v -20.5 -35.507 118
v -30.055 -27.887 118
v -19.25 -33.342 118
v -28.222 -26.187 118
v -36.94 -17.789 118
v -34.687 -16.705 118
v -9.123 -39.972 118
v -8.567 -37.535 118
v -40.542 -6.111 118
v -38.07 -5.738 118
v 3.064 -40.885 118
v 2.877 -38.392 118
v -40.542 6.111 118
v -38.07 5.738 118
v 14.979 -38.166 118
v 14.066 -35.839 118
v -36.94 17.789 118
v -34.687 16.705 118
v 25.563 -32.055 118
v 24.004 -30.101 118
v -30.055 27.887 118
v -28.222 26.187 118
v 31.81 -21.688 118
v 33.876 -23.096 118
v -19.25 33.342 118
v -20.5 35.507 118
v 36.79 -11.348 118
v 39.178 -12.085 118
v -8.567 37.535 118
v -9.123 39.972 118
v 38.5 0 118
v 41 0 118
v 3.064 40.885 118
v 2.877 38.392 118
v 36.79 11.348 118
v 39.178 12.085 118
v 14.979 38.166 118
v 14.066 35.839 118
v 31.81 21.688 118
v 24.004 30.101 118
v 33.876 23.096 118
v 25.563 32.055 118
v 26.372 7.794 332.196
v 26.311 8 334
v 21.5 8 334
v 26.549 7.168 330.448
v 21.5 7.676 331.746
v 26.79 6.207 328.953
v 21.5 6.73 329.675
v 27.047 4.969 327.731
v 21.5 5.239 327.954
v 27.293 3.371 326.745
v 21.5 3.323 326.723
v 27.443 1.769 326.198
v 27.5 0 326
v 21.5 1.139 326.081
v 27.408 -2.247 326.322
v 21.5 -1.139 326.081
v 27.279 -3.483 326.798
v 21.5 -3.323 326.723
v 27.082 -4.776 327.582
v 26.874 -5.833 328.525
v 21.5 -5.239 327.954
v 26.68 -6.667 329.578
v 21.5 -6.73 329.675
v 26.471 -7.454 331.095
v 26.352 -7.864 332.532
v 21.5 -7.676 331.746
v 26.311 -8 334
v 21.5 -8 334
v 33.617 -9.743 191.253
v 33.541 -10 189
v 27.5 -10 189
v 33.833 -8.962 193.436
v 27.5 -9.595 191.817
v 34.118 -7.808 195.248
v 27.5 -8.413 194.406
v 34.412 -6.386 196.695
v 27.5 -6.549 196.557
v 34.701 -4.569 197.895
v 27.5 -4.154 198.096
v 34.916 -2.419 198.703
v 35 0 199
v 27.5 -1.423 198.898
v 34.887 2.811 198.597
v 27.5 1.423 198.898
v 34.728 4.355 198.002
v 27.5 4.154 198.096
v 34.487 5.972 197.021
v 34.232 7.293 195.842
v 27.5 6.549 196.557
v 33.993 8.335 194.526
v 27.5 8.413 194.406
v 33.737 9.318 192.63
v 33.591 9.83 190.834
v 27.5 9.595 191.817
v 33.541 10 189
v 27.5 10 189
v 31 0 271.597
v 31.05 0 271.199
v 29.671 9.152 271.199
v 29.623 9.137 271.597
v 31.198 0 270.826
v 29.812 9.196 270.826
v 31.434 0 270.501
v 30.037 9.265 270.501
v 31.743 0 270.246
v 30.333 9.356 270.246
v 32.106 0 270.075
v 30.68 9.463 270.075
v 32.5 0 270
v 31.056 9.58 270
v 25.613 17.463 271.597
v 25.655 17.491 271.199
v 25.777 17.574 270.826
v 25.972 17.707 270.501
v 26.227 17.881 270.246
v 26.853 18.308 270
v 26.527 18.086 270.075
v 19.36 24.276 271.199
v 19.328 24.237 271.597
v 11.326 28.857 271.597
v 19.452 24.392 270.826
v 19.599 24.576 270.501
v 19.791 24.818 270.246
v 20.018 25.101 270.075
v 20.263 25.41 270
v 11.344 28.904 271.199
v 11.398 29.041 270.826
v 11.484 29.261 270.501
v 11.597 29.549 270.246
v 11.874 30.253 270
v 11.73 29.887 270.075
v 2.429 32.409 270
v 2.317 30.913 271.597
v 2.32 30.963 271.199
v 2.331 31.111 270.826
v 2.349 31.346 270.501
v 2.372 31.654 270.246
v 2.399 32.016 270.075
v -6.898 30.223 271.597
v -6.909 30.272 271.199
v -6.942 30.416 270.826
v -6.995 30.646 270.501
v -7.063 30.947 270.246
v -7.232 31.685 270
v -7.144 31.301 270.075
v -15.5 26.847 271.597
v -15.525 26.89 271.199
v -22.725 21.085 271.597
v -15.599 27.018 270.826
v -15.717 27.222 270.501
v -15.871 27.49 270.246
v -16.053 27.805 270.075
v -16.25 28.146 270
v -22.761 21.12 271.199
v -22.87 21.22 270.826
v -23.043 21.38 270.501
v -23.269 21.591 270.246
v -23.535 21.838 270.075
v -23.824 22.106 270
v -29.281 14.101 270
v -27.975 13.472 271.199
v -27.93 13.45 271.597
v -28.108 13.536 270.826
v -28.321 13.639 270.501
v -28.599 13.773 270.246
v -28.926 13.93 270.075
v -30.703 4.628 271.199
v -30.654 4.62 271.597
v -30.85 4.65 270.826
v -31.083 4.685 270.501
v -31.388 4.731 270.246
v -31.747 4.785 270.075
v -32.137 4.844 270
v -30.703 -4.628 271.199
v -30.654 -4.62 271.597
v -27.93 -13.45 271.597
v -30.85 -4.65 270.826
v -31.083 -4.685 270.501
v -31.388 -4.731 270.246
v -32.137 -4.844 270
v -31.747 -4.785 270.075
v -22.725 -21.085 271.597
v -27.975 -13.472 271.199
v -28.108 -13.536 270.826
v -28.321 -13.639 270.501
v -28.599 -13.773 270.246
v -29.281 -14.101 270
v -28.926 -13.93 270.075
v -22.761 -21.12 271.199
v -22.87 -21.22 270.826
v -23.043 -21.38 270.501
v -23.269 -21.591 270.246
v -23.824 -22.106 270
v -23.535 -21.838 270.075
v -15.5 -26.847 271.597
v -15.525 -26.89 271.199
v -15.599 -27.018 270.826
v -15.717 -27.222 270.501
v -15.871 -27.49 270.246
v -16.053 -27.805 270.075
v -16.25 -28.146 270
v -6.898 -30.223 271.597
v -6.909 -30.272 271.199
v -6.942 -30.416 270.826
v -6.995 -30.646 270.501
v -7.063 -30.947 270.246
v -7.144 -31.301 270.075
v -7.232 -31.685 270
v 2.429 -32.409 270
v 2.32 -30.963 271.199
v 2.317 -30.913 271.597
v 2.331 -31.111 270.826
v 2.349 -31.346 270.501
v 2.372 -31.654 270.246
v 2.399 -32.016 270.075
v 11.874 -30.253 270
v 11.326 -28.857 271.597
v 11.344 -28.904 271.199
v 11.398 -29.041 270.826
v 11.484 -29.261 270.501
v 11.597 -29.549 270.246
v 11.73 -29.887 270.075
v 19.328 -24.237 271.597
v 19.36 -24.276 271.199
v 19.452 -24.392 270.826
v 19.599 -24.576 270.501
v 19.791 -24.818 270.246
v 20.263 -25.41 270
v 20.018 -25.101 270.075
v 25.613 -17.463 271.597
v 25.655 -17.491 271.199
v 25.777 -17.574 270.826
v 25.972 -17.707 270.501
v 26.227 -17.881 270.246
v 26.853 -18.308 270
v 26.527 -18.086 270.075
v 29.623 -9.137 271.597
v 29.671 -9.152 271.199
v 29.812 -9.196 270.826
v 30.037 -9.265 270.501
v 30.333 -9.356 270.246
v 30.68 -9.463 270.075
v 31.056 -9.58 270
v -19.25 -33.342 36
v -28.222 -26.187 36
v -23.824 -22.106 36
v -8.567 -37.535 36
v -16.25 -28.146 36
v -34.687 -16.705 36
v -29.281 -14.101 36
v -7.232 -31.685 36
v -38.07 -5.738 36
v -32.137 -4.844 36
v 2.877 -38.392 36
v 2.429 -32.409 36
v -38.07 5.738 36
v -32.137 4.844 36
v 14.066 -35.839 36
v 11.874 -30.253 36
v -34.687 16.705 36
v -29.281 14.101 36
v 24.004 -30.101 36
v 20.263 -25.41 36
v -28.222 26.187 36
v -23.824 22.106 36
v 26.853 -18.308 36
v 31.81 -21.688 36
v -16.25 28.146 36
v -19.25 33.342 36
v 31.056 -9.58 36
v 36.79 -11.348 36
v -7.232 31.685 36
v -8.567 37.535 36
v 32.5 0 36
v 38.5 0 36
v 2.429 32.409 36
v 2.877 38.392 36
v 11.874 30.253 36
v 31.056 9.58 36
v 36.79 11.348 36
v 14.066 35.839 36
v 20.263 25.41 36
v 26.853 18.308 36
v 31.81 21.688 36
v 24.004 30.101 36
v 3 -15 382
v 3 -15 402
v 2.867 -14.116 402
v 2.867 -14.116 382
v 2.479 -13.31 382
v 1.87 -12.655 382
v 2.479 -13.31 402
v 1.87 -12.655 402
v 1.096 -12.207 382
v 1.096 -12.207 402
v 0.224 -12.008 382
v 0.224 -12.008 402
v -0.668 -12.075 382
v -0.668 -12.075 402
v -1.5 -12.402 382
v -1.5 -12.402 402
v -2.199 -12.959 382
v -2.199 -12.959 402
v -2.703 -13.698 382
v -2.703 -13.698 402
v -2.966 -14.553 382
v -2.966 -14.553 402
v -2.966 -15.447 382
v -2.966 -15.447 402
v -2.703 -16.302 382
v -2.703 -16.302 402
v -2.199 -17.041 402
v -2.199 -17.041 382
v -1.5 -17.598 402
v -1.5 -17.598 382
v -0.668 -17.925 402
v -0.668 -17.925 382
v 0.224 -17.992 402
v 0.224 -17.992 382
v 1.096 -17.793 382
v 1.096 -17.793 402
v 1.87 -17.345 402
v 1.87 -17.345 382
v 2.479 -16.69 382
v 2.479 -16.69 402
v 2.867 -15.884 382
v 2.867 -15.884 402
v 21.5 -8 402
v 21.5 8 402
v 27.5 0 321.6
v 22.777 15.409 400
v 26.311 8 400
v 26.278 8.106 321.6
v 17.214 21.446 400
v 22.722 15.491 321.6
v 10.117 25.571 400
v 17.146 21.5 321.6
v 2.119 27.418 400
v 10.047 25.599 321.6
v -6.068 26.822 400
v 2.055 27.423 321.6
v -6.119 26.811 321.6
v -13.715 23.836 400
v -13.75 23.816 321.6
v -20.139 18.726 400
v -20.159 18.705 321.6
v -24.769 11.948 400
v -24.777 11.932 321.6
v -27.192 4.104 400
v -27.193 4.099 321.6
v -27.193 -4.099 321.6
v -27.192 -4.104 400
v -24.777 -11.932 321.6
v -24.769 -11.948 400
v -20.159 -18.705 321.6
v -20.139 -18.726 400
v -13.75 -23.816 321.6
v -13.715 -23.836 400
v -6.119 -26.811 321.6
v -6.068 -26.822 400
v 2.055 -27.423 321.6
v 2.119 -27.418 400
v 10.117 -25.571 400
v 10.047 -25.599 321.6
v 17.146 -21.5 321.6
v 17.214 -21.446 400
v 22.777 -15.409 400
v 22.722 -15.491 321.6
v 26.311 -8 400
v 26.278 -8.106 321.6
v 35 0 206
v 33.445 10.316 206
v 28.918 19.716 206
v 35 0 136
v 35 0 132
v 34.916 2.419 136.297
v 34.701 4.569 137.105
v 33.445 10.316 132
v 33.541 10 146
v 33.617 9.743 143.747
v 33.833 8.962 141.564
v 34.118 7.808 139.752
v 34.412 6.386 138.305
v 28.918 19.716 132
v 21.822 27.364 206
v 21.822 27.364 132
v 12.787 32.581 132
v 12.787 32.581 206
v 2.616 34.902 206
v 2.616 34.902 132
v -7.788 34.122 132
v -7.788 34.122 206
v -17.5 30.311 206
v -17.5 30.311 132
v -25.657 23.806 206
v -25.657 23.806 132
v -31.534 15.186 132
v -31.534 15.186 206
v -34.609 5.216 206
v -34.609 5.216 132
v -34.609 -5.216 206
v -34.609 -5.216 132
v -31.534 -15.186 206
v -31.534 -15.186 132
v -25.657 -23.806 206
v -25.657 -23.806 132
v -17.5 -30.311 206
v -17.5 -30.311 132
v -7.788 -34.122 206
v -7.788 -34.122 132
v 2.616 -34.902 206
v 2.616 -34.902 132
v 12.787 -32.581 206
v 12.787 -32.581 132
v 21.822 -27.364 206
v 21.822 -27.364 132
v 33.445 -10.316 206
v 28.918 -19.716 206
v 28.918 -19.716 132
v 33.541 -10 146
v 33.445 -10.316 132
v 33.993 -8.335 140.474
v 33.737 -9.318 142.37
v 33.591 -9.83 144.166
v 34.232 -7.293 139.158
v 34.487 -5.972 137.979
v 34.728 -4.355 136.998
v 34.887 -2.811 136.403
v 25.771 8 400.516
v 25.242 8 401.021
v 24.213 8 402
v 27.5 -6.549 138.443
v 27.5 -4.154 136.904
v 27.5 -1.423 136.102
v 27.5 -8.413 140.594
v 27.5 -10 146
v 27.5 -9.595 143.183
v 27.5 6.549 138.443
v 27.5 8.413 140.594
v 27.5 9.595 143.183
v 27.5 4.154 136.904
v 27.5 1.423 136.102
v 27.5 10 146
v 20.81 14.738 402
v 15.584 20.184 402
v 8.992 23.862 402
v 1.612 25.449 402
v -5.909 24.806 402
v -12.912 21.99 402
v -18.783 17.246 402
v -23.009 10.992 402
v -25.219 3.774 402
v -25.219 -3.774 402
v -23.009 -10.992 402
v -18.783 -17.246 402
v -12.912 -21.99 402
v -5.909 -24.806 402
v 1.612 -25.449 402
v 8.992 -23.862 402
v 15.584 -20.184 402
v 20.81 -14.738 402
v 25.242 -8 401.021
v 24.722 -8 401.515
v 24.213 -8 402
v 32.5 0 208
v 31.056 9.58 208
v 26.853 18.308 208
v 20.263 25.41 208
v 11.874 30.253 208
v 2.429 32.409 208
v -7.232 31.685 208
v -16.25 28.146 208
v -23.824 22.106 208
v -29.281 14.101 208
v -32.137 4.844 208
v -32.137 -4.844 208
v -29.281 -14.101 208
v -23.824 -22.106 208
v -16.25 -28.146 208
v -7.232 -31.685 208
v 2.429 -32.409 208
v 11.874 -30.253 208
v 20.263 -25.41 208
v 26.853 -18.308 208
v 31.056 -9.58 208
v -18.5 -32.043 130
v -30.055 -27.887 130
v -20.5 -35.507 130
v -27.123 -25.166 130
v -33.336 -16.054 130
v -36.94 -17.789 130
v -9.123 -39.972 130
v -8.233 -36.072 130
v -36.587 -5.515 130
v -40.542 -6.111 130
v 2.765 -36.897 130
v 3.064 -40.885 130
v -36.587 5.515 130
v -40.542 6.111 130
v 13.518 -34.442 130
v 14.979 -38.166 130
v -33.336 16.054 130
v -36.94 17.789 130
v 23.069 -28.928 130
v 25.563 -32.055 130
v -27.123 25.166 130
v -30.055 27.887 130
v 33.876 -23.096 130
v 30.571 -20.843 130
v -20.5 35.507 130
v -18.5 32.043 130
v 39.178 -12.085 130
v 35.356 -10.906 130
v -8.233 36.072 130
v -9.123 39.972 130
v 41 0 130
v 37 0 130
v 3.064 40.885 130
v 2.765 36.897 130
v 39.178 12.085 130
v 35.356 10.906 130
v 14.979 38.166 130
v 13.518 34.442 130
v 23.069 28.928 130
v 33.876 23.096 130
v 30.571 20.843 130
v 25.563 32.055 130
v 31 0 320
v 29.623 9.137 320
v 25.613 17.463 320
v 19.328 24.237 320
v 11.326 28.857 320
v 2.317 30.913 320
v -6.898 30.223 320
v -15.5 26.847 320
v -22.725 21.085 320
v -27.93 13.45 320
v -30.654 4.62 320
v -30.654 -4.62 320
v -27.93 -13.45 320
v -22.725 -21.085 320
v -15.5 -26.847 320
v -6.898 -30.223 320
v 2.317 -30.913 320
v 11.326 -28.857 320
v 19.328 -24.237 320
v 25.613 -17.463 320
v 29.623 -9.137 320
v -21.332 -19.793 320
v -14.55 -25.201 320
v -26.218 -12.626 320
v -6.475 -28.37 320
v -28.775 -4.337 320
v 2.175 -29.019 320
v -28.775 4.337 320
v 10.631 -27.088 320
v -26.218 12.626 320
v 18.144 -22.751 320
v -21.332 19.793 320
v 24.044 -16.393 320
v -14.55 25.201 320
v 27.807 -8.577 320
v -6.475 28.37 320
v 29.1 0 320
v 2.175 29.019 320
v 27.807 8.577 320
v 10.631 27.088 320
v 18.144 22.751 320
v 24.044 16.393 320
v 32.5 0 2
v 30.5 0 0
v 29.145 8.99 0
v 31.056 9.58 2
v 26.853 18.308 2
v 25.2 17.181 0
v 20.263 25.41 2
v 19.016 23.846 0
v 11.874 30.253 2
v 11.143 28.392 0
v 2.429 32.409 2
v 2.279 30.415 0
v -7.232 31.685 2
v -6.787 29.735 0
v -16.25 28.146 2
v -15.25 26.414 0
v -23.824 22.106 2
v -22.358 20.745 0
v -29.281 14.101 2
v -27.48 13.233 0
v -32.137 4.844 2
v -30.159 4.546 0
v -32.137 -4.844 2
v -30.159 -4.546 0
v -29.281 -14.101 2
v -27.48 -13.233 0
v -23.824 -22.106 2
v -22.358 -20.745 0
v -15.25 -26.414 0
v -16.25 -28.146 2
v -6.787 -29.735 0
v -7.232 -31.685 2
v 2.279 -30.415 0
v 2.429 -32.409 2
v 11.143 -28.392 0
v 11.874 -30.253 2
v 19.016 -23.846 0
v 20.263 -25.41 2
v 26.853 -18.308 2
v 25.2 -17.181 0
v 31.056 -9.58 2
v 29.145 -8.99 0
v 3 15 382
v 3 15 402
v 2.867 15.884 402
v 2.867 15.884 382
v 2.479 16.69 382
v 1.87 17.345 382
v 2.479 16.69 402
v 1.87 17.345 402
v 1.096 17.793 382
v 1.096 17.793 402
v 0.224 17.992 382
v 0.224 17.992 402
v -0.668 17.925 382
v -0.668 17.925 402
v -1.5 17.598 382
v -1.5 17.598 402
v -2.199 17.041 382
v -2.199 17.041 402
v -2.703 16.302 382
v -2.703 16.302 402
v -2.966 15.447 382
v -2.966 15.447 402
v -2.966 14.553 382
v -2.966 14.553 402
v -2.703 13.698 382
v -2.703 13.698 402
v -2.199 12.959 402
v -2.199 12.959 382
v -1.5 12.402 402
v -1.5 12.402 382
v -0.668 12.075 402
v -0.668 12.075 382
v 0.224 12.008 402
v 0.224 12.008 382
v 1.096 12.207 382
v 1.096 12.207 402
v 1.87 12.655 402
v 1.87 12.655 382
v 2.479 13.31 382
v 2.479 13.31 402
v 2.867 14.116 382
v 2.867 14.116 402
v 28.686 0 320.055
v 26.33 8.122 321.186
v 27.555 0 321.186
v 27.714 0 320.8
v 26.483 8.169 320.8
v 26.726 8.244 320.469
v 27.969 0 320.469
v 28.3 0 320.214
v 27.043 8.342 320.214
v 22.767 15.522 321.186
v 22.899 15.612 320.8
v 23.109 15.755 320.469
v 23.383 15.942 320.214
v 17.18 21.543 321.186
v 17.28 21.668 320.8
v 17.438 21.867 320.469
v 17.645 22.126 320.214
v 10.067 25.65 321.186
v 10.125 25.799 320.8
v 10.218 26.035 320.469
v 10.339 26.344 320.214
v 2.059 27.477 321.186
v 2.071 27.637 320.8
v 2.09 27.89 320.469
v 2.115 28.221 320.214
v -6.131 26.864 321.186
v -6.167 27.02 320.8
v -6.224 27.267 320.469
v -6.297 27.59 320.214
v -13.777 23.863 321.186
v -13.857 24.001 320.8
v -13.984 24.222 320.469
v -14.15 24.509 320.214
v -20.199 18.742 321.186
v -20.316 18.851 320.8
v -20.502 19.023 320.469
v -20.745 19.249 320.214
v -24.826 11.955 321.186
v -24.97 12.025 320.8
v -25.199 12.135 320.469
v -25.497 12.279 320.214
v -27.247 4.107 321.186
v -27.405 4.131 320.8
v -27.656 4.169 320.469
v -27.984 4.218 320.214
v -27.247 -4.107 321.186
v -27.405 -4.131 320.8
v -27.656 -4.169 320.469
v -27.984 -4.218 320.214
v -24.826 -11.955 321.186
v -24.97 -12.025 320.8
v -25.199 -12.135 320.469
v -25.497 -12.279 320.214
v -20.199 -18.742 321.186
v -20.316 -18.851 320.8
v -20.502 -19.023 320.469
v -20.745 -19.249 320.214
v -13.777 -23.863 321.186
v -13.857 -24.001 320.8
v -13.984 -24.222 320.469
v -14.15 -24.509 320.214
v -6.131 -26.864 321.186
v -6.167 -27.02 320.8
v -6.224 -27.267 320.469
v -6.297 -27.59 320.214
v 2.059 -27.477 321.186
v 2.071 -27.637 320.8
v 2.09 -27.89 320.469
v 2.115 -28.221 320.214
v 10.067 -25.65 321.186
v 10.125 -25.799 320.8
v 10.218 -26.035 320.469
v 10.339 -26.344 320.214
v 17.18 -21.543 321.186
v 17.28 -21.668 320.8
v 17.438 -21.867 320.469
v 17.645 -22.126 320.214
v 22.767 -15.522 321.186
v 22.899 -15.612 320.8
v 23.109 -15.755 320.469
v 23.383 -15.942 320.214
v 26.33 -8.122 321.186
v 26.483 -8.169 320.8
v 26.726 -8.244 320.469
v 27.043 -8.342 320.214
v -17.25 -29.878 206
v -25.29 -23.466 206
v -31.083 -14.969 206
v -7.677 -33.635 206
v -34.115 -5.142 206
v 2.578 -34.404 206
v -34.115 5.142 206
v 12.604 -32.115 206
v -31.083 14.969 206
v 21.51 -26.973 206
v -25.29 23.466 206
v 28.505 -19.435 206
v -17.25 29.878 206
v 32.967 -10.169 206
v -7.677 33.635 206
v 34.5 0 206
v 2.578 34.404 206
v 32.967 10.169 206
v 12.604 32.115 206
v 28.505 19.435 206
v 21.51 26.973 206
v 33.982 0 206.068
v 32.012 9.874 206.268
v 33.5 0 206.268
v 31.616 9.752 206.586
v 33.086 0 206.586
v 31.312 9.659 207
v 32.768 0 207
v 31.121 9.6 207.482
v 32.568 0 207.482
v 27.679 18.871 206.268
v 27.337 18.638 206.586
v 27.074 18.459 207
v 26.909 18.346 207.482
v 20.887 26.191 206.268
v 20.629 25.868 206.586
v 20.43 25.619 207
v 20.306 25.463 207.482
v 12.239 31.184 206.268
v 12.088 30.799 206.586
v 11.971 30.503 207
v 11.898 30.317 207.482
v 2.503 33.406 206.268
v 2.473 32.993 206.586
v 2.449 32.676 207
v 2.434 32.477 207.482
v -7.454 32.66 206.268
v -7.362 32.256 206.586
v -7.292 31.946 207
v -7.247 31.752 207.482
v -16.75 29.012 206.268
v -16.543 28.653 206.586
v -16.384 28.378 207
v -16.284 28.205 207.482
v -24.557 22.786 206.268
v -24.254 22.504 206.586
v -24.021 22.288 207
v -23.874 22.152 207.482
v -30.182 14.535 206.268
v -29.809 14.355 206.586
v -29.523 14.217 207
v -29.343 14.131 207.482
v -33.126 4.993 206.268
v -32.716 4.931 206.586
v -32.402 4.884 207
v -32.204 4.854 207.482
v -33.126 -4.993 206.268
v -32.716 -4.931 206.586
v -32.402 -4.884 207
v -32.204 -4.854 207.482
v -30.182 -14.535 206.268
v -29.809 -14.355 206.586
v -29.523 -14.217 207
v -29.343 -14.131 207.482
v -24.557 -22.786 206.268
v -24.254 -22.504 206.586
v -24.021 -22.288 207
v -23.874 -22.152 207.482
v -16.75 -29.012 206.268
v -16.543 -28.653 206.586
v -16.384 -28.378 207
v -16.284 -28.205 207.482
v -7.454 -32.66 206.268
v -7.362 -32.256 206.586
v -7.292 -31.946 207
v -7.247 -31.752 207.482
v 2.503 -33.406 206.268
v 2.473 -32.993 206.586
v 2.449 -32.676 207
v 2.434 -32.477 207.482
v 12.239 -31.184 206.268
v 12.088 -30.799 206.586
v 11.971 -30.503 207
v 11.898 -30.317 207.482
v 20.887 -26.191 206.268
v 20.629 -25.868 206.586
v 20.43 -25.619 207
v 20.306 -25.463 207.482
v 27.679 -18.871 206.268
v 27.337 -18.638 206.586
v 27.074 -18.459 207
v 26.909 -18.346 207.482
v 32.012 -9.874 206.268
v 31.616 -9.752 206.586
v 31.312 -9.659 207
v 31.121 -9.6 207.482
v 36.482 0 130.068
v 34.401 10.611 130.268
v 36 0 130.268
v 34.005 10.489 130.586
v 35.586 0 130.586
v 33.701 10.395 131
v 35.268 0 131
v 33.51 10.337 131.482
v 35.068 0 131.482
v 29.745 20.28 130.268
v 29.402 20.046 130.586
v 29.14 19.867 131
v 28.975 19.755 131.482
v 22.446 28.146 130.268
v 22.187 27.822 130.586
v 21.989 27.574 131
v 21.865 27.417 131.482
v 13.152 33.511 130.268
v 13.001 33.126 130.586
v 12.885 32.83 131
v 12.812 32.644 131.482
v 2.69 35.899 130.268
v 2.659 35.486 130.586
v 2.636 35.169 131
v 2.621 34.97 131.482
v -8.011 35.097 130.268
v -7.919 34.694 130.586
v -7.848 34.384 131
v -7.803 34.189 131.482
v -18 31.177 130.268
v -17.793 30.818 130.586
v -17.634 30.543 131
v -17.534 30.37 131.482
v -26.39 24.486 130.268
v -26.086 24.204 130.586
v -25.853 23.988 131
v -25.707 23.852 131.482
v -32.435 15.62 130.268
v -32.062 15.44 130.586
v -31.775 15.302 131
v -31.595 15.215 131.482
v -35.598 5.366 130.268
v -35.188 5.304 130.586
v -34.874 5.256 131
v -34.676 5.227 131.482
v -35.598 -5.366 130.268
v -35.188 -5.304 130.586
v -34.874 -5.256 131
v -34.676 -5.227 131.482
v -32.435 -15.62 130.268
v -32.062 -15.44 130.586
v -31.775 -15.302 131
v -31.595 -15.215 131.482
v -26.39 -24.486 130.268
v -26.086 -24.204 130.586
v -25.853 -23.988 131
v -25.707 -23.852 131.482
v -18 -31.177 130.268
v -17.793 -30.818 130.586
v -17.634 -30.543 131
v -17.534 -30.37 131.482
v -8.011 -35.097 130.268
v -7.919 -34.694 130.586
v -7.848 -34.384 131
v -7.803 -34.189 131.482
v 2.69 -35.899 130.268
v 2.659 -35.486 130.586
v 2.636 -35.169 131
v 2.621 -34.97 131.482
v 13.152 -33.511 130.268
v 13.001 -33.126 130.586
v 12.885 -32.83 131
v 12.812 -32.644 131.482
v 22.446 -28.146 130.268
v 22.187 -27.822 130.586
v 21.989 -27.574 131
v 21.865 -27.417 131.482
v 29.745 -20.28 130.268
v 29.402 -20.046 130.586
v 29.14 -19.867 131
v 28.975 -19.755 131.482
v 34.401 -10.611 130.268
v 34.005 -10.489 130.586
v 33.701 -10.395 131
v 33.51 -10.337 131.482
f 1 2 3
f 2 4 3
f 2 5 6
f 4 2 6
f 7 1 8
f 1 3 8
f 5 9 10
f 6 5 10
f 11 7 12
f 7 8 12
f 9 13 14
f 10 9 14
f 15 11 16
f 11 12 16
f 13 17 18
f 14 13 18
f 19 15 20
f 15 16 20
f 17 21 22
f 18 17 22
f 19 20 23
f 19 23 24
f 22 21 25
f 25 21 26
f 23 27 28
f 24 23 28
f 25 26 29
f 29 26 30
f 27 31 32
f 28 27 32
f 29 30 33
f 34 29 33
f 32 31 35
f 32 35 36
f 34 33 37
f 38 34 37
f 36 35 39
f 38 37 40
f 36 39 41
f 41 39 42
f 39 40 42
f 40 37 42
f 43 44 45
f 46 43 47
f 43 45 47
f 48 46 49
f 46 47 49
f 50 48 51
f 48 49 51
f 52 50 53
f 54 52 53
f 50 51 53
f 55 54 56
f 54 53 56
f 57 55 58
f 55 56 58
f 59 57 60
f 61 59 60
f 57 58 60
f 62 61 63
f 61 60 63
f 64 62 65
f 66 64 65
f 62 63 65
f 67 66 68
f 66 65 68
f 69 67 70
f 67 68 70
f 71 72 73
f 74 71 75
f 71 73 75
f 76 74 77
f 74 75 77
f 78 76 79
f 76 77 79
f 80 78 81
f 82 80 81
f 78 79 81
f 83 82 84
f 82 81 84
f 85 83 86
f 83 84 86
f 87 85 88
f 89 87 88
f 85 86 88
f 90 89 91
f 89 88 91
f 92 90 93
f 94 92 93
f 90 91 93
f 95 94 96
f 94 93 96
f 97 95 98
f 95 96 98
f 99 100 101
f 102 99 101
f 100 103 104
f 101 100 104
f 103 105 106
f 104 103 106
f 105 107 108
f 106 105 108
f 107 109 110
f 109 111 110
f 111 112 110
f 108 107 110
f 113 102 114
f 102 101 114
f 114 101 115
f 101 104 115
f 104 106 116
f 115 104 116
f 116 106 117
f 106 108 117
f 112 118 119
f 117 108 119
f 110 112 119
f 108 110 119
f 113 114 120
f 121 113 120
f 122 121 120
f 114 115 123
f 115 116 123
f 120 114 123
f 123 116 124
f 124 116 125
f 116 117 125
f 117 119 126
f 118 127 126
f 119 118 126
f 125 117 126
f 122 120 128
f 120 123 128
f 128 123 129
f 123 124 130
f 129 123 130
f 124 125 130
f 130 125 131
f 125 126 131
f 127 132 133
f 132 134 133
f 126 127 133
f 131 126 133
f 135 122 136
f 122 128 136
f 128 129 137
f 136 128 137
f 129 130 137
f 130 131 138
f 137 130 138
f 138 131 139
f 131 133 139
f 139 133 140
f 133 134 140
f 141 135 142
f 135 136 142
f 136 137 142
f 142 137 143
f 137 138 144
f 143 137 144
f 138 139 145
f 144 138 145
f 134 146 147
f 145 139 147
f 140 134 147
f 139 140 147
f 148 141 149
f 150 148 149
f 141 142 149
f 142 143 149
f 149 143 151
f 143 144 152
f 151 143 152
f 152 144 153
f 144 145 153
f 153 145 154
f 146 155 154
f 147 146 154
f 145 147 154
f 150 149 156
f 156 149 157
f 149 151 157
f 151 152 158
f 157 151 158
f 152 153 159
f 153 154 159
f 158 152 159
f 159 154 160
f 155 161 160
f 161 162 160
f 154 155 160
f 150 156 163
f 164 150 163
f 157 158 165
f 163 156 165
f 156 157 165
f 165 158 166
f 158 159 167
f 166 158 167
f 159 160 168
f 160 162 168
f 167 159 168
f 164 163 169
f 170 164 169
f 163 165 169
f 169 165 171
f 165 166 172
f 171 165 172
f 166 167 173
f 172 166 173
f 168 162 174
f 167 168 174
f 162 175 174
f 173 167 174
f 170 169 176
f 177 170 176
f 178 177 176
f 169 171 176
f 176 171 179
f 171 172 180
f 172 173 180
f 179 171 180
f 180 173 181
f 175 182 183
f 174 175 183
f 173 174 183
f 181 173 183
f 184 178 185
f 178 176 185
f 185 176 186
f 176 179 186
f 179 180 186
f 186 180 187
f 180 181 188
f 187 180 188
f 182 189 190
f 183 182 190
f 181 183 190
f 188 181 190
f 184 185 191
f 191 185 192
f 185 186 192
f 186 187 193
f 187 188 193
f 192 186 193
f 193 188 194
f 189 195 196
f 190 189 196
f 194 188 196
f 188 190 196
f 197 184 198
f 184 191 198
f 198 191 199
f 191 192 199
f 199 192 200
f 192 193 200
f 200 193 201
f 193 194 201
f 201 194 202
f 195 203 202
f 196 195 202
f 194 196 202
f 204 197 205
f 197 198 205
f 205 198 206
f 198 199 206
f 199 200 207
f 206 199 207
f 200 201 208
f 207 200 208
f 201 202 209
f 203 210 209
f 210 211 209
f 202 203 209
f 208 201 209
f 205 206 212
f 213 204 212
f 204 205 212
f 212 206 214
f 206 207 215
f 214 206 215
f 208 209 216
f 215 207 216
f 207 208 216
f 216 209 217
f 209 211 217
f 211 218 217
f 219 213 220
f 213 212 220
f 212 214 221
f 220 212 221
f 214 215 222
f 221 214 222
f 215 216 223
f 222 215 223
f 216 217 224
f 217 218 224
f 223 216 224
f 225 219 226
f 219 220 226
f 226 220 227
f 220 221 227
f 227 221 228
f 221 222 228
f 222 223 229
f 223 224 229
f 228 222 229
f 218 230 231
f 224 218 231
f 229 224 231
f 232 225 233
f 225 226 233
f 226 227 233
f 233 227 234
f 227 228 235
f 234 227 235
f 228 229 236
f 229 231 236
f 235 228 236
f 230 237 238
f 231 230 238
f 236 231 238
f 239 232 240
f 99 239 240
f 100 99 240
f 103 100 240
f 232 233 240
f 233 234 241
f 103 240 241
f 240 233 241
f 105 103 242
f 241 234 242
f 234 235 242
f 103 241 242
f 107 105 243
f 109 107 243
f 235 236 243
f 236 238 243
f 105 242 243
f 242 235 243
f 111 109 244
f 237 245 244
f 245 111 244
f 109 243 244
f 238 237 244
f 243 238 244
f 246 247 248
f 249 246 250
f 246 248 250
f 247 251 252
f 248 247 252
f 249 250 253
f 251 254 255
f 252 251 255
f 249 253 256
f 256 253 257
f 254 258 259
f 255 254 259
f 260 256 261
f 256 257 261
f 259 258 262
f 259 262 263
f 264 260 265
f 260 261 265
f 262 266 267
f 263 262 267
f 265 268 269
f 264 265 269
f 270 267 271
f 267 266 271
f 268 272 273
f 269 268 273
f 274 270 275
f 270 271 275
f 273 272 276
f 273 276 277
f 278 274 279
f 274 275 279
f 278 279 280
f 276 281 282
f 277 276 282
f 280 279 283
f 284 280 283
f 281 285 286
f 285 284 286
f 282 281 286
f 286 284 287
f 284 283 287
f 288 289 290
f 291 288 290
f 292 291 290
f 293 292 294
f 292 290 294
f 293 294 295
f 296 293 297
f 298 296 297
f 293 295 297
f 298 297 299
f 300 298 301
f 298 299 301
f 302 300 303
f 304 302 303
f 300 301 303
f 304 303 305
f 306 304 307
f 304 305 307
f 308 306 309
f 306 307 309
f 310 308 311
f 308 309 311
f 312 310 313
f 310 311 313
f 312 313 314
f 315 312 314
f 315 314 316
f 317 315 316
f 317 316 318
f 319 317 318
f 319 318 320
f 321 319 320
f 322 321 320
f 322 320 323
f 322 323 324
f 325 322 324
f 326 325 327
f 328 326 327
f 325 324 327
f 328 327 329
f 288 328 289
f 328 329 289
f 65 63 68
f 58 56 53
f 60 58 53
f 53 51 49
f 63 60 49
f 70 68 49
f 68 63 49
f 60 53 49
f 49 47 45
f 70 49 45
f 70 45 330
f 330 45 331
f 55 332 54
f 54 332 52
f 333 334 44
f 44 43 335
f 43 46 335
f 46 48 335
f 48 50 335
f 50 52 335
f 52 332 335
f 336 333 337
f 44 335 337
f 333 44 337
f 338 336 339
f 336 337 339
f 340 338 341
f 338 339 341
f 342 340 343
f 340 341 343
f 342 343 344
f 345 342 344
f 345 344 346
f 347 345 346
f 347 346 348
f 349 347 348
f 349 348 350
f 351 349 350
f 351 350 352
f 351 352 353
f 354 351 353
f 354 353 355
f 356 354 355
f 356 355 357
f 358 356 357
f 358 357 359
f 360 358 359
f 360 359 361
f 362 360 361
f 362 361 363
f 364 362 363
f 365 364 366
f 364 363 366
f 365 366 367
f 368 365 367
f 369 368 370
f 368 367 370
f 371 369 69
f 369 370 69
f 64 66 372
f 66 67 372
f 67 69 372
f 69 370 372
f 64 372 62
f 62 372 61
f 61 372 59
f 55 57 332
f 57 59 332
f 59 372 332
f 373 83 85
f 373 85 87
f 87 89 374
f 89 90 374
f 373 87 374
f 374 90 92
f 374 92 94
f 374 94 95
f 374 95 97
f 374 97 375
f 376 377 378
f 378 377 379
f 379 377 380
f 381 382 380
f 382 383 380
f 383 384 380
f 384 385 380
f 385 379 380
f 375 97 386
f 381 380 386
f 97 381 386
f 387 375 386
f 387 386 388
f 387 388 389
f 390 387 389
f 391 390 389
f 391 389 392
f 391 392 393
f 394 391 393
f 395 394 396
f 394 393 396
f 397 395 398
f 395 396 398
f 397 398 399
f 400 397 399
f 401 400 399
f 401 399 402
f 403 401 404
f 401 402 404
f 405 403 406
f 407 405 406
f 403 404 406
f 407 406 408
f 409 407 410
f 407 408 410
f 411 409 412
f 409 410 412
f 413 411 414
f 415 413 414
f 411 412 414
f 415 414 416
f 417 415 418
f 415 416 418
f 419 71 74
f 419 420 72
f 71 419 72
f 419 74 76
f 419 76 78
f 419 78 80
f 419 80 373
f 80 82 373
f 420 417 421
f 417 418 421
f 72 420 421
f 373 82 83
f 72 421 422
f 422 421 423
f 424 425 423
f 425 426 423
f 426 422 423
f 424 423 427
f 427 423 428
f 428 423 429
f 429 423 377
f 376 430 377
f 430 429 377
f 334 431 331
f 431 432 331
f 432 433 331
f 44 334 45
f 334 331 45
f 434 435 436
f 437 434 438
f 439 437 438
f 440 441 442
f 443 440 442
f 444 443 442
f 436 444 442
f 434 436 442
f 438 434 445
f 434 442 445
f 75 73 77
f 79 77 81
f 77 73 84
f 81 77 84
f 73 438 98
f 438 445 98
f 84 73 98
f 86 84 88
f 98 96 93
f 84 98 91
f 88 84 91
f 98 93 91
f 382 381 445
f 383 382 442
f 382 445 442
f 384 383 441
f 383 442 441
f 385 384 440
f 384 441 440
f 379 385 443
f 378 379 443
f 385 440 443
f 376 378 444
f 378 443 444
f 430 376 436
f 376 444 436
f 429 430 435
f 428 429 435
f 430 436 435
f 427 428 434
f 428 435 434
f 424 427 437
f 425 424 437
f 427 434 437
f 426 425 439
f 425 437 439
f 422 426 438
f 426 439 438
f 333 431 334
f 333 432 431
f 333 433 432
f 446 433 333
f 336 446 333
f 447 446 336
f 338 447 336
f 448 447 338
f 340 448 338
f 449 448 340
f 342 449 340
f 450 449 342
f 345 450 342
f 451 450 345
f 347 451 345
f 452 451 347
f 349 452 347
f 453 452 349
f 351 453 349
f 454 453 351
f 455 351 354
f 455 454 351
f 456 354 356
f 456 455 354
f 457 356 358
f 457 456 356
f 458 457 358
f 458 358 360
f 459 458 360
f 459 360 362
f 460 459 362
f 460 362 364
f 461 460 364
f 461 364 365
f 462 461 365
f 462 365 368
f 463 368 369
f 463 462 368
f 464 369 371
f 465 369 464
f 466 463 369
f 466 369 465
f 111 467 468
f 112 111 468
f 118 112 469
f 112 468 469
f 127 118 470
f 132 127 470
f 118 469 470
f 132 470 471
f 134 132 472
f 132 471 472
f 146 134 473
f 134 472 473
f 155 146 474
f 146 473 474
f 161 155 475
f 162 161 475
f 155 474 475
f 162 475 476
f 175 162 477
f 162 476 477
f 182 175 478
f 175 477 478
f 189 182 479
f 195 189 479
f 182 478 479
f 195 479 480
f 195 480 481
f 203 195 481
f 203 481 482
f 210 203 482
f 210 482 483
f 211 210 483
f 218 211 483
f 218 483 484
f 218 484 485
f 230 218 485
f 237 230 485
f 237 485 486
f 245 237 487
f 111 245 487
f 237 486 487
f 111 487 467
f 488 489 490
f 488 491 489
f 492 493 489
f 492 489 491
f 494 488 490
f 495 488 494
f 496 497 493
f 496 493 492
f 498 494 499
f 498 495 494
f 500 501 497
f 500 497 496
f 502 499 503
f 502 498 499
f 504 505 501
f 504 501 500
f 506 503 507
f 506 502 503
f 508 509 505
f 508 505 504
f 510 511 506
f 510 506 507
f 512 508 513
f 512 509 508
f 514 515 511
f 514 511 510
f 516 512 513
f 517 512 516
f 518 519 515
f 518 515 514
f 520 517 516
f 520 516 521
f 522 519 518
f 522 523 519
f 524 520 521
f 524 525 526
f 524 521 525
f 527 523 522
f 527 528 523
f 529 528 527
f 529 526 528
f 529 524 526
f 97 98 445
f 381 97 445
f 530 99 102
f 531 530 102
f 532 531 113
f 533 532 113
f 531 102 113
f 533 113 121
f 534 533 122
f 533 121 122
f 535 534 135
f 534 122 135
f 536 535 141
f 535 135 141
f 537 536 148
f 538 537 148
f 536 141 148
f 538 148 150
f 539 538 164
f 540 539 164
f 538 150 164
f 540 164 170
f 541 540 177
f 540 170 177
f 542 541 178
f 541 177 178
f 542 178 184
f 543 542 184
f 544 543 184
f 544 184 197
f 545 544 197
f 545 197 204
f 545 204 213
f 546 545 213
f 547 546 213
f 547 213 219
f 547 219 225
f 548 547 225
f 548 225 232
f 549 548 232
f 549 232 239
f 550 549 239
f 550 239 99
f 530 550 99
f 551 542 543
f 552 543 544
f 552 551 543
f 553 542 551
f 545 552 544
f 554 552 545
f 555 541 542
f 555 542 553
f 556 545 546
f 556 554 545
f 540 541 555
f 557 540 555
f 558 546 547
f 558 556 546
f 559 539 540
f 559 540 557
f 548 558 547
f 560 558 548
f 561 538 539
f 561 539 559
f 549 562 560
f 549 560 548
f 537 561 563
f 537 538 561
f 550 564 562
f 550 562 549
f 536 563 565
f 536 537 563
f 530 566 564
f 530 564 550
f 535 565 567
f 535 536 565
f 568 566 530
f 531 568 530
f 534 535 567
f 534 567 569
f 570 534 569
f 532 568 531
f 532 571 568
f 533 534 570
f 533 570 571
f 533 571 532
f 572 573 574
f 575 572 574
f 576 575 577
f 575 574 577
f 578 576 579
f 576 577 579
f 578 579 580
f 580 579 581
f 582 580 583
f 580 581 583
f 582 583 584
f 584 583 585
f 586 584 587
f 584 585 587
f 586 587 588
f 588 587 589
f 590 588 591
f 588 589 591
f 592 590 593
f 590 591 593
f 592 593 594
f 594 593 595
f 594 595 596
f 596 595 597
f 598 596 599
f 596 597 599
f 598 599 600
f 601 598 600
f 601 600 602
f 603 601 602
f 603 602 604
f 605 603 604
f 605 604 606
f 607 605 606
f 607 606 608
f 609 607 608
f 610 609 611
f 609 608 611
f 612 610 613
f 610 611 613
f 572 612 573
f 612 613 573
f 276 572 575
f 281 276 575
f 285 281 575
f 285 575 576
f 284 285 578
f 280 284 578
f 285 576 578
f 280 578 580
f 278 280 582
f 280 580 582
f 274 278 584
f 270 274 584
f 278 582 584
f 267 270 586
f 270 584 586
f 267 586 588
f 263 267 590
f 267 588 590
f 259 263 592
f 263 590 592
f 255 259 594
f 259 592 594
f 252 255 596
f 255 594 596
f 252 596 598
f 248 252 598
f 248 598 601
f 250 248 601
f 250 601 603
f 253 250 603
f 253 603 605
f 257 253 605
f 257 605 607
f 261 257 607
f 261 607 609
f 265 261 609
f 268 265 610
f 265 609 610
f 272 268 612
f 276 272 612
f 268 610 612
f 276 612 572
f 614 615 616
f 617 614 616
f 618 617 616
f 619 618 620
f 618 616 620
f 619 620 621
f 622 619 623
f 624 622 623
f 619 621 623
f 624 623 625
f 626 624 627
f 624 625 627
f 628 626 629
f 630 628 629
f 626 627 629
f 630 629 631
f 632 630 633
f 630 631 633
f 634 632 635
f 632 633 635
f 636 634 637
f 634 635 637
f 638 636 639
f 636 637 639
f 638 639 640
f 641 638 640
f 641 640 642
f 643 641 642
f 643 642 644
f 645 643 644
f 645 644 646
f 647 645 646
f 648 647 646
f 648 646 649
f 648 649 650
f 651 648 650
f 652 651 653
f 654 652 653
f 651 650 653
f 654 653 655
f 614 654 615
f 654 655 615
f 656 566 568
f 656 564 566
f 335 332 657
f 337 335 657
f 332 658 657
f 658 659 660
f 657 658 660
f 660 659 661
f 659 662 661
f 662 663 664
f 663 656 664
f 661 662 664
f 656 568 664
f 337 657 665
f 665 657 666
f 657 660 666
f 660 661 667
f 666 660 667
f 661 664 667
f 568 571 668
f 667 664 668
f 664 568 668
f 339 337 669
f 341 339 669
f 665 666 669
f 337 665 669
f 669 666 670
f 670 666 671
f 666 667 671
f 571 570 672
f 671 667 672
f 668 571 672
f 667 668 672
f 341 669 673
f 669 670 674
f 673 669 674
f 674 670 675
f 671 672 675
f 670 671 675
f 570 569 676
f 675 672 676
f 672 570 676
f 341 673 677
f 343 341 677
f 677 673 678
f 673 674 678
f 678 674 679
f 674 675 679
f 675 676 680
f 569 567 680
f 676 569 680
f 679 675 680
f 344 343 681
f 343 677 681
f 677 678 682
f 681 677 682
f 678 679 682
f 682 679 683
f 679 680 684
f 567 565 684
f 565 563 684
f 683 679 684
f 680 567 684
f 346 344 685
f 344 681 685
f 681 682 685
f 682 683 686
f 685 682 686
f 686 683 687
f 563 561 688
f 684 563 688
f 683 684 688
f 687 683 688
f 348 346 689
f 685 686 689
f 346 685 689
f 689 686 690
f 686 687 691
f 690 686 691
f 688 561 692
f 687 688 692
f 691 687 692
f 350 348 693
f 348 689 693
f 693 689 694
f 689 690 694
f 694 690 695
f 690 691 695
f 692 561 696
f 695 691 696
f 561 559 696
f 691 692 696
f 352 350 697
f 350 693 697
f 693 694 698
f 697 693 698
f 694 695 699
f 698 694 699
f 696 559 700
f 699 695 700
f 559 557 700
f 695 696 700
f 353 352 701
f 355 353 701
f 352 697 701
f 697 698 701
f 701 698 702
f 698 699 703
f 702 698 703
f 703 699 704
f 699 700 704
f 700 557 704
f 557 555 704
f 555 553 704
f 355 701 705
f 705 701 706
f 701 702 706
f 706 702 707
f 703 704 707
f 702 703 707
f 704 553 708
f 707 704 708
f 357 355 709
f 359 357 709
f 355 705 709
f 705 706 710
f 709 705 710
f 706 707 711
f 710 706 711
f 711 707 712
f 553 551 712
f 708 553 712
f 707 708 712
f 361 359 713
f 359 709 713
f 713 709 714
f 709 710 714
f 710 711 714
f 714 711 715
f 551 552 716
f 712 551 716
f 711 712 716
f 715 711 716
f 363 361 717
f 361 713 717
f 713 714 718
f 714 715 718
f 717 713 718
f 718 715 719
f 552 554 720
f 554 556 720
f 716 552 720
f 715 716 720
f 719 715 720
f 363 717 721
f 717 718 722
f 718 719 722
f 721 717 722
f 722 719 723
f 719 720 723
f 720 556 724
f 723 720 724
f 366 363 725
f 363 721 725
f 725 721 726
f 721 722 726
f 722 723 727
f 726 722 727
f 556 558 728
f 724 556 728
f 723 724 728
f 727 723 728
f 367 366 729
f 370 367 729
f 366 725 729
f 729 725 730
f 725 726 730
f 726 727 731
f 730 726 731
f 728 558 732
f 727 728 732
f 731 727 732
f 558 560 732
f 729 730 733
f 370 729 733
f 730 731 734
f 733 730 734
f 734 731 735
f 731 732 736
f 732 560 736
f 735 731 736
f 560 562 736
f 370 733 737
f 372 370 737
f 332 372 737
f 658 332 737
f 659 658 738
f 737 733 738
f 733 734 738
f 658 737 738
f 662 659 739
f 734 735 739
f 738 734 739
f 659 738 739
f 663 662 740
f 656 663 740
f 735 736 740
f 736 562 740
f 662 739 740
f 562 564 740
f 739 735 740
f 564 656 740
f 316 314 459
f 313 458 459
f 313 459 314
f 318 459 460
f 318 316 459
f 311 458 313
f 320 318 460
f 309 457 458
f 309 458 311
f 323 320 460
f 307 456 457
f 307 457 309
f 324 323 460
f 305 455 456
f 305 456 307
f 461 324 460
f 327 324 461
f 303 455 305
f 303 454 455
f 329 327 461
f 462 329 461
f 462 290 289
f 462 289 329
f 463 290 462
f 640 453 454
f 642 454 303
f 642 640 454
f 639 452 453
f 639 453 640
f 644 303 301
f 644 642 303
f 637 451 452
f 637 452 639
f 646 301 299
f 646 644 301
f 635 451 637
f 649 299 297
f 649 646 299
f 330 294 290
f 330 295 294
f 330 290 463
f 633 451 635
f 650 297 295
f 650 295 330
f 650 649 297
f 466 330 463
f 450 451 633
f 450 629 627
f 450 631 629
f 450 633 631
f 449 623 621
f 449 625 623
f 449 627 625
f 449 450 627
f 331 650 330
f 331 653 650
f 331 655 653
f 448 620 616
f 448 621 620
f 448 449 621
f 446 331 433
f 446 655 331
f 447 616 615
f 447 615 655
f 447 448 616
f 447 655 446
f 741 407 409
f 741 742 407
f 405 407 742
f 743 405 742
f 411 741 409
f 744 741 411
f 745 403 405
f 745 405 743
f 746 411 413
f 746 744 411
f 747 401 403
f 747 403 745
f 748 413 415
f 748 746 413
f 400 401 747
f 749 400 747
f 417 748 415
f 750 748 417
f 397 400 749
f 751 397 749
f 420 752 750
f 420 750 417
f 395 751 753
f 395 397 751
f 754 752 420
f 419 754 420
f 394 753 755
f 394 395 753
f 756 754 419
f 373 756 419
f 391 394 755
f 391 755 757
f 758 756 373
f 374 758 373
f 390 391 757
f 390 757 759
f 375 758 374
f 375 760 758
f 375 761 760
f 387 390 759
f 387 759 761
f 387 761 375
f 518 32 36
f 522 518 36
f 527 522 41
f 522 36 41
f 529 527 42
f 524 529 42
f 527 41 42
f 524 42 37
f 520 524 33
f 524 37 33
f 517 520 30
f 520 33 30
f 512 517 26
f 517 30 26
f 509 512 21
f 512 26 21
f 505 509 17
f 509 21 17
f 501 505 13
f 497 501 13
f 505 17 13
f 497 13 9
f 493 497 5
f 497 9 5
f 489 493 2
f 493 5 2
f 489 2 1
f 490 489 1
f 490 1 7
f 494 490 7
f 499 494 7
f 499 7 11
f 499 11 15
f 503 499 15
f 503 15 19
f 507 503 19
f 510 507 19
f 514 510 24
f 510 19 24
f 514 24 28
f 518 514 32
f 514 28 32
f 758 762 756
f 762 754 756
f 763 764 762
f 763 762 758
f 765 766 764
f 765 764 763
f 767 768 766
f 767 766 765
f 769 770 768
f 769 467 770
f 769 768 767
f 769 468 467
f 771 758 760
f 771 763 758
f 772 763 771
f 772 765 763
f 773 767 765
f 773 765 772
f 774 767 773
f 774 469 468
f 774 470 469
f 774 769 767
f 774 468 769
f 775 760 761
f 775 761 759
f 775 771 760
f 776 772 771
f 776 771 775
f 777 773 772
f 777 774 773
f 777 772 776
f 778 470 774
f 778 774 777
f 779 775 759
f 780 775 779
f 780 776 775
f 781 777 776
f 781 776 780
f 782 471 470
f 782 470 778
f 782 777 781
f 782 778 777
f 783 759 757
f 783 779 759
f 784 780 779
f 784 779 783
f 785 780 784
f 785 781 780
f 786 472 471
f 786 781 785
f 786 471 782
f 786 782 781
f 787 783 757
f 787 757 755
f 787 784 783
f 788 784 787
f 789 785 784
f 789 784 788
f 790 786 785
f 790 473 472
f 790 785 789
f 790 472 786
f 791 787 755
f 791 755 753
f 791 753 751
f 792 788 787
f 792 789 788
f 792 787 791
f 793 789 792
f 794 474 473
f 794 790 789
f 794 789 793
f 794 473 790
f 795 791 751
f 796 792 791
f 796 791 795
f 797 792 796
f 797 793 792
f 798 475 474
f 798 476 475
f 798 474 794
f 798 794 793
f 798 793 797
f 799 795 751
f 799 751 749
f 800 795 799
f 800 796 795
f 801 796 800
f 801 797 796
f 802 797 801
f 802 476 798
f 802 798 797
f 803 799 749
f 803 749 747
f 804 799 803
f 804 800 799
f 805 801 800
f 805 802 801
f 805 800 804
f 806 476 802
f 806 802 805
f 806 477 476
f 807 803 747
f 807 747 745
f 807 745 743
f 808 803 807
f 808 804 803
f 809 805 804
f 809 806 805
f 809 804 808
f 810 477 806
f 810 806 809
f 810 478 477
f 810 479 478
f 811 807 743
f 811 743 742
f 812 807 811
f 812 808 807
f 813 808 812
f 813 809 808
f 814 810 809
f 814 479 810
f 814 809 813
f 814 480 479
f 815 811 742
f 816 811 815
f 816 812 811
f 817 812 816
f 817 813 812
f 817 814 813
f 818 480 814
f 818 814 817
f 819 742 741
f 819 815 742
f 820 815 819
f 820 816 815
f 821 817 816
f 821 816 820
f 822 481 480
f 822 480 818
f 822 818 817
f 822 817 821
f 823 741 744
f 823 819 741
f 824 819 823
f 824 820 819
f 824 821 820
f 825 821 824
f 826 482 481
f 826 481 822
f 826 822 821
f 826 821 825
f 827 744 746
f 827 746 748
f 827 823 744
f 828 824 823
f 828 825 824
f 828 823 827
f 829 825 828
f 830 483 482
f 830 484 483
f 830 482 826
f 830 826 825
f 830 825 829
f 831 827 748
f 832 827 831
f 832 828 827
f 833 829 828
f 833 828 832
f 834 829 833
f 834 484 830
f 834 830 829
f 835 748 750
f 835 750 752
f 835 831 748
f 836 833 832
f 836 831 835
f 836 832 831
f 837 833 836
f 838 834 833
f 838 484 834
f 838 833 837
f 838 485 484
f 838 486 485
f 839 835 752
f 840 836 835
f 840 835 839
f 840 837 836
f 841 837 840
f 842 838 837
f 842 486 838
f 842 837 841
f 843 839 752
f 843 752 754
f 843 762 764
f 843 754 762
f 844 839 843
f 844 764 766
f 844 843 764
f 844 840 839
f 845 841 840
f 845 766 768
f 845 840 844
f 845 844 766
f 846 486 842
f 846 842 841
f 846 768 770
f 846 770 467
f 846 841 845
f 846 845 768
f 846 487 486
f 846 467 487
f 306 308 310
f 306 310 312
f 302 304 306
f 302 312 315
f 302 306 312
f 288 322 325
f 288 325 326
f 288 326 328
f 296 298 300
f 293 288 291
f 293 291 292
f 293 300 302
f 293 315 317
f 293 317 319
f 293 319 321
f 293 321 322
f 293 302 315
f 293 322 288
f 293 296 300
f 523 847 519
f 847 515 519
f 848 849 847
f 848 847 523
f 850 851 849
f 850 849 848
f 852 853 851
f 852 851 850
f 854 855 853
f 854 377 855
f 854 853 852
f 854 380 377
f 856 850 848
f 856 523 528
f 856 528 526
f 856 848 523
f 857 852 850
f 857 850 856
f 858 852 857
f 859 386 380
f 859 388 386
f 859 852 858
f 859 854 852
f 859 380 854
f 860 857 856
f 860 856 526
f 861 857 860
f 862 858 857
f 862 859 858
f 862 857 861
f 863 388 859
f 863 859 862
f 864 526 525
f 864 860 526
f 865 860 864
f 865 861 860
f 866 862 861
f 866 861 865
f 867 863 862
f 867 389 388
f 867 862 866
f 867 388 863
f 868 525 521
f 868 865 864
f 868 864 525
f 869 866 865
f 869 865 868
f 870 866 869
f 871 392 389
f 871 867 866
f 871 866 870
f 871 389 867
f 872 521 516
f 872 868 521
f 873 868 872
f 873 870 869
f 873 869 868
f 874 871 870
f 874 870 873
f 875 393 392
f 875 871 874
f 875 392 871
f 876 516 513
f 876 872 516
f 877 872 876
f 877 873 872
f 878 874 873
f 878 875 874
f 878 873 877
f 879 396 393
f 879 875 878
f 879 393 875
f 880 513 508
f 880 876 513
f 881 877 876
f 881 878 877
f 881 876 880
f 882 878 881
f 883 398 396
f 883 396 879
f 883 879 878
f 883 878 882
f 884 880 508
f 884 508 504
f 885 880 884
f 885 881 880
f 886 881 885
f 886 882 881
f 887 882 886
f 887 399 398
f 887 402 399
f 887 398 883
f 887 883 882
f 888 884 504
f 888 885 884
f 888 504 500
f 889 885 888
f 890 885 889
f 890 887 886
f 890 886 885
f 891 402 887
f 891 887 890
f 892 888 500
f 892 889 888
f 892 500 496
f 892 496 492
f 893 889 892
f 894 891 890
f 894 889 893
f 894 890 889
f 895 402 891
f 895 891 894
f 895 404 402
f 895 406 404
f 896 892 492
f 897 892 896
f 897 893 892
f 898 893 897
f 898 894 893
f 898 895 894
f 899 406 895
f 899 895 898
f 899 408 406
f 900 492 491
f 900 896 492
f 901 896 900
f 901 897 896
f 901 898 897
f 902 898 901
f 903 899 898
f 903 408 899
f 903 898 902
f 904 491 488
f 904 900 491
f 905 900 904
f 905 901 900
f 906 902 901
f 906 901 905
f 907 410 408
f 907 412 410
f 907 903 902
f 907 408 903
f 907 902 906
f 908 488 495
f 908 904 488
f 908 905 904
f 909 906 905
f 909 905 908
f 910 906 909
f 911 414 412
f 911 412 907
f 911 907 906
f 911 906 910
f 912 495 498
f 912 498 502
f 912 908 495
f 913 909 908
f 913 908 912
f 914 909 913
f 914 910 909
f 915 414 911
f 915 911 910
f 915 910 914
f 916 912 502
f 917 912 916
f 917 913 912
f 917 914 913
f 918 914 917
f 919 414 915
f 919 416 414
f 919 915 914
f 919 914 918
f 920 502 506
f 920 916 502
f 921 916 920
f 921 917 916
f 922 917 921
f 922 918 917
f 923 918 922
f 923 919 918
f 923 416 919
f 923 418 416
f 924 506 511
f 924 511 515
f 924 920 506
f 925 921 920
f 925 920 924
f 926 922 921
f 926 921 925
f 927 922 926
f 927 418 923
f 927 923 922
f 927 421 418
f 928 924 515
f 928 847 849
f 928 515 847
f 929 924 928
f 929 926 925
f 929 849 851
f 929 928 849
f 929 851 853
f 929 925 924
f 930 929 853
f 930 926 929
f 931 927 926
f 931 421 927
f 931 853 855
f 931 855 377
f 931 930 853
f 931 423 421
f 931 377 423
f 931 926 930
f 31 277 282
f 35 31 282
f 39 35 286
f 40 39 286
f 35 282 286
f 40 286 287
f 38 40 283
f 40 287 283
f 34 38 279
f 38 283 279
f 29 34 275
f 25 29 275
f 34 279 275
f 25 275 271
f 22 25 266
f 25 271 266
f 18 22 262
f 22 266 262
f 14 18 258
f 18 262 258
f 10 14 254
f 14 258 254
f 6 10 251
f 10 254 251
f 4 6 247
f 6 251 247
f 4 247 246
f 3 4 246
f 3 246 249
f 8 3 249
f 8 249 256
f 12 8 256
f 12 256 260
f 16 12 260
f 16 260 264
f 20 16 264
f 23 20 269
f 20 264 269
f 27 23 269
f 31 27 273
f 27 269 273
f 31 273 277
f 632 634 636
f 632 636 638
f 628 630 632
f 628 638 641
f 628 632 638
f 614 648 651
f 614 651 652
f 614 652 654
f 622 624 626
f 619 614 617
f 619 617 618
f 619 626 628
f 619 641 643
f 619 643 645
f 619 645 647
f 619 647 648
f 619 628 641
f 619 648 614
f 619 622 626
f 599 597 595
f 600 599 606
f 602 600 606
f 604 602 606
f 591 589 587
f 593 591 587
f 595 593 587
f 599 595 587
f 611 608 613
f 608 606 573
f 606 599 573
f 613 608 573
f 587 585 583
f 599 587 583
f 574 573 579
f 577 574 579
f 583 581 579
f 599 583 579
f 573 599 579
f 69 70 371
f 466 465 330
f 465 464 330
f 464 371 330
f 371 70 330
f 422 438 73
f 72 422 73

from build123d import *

# Parameters (mm, degrees)
SKETCH_1_R          = 32.5
EXTRUDE_1_DEPTH     = 36
SKETCH_2_R          = 38.5
EXTRUDE_2_DEPTH     = 82
SKETCH_3_R          = 41
EXTRUDE_3_DEPTH     = 12
SKETCH_4_R          = 35
EXTRUDE_4_DEPTH     = 76
SKETCH_5_R          = 32.5
EXTRUDE_5_DEPTH     = 64
SKETCH_6_R          = 31
EXTRUDE_6_DEPTH     = 50
SKETCH_7_R          = 27.5
EXTRUDE_7_DEPTH     = 82
FILLET_1_R          = 2
FILLET_2_R          = 1.6
CHAMFER_1_SIZE      = 2
CUT_EXTRUDE_1_DEPTH = 29
CUT_EXTRUDE_2_DEPTH = 20
SKETCH_10_R         = 3
CUT_EXTRUDE_3_DEPTH = 20


with BuildPart() as part:
    # 草图1 → 凸台-拉伸1 (new body)
    with BuildSketch(Plane.XY):
        Circle(SKETCH_1_R)
    extrude(amount=EXTRUDE_1_DEPTH)

    # 草图2 → 凸台-拉伸2 (add)
    with BuildSketch(Plane.XY.offset(36)):
        Circle(SKETCH_2_R)
    extrude(amount=EXTRUDE_2_DEPTH)

    # 草图3 → 凸台-拉伸3 (add)
    with BuildSketch(Plane.XY.offset(118)):
        Circle(SKETCH_3_R)
    extrude(amount=EXTRUDE_3_DEPTH)

    # 草图4 → 凸台-拉伸4 (add)
    with BuildSketch(Plane.XY.offset(130)):
        Circle(SKETCH_4_R)
    extrude(amount=EXTRUDE_4_DEPTH)

    # 草图5 → 凸台-拉伸5 (add)
    with BuildSketch(Plane.XY.offset(206)):
        Circle(SKETCH_5_R)
    extrude(amount=EXTRUDE_5_DEPTH)

    # 草图6 → 凸台-拉伸6 (add)
    with BuildSketch(Plane.XY.offset(270)):
        Circle(SKETCH_6_R)
    extrude(amount=EXTRUDE_6_DEPTH)

    # 草图7 → 凸台-拉伸7 (add)
    with BuildSketch(Plane.XY.offset(320)):
        Circle(SKETCH_7_R)
    extrude(amount=EXTRUDE_7_DEPTH)

    # 圆角1
    fillet_1_edges = [part.edges().sort_by_distance(p)[0] for p in [
        (-35, 0, 130),
        (-32.5, 0, 206),
    ]]
    fillet(fillet_1_edges, radius=FILLET_1_R)

    # 圆角2
    # the kernel refuses this fillet: 1.6 mm, written as the material it adds along each edge
    with BuildSketch(Plane(origin=(0, 0, 270), x_dir=(1, 0, 0), z_dir=(0, -1, 0))) as fillet_2_piece_1:
        with BuildLine():
            CenterArc((32.6, 1.596871942), FILLET_2_R, 180, 86.416678302)
            Line((31, 1.596871942), (30.968, 1.596871942))
            Line((30.968, 1.596871942), (30.968, 0))
            Line((30.968, 0), (31, -0.032))
            ThreePointArc((31, -0.032), (31.75, -0.032), (32.498, -0.031937439))
            Line((32.498, -0.031937439), (32.5, 0))
        make_face()
    revolve(axis=Axis((0, 0, 270), (0, 0, 1)))
    with BuildSketch(Plane(origin=(0, 0, 320), x_dir=(1, 0, 0), z_dir=(0, -1, 0))) as fillet_2_piece_2:
        with BuildLine():
            CenterArc((27.5 + FILLET_2_R, FILLET_2_R), FILLET_2_R, 180, 90)
            Line((27.5, FILLET_2_R), (27.5 - FILLET_2_R * 0.02, FILLET_2_R))
            Line((27.5 - FILLET_2_R * 0.02, FILLET_2_R), (27.5 - FILLET_2_R * 0.02, -FILLET_2_R * 0.02))
            Line((27.5 - FILLET_2_R * 0.02, -FILLET_2_R * 0.02), (27.5 + FILLET_2_R, -FILLET_2_R * 0.02))
            Line((27.5 + FILLET_2_R, -FILLET_2_R * 0.02), (27.5 + FILLET_2_R, 0))
        make_face()
    revolve(axis=Axis((0, 0, 320), (0, 0, 1)))

    # 倒角1
    chamfer_1_edges = [part.edges().sort_by_distance(p)[0] for p in [
        (-32.5, 0, 0),
        (-27.5, 0, 402),
    ]]
    chamfer(chamfer_1_edges, length=CHAMFER_1_SIZE)

    # 草图8 → 切除-拉伸1 (cut)
    with BuildSketch(Plane(origin=(27.5, 0, 0), x_dir=(0, 0, -1), z_dir=(1, 0, 0))):
        with BuildLine():
            Line((-189, 10), (-146, 10))
            ThreePointArc((-146, 10), (-136, 0), (-146, -10))
            Line((-146, -10), (-189, -10))
            ThreePointArc((-189, -10), (-199, 0), (-189, 10))
        make_face()
    extrude(amount=CUT_EXTRUDE_1_DEPTH, mode=Mode.SUBTRACT)

    # 草图9 → 切除-拉伸2 (cut)
    with BuildSketch(Plane(origin=(21.5, 0, 0), x_dir=(0, 0, -1), z_dir=(1, 0, 0))):
        with BuildLine():
            Line((-402, 8), (-334, 8))
            ThreePointArc((-334, 8), (-326, 0), (-334, -8))
            Line((-334, -8), (-402, -8))
            Line((-402, -8), (-402, 8))
        make_face()
    extrude(amount=CUT_EXTRUDE_2_DEPTH, mode=Mode.SUBTRACT)

    # 草图10 → 切除-拉伸3 (cut)
    with BuildSketch(Plane.XY.offset(402)):
        with Locations((0, 15)):
            Circle(SKETCH_10_R)
        with Locations((0, -15)):
            Circle(SKETCH_10_R)
    extrude(amount=-CUT_EXTRUDE_3_DEPTH, mode=Mode.SUBTRACT)


solid = part.part
